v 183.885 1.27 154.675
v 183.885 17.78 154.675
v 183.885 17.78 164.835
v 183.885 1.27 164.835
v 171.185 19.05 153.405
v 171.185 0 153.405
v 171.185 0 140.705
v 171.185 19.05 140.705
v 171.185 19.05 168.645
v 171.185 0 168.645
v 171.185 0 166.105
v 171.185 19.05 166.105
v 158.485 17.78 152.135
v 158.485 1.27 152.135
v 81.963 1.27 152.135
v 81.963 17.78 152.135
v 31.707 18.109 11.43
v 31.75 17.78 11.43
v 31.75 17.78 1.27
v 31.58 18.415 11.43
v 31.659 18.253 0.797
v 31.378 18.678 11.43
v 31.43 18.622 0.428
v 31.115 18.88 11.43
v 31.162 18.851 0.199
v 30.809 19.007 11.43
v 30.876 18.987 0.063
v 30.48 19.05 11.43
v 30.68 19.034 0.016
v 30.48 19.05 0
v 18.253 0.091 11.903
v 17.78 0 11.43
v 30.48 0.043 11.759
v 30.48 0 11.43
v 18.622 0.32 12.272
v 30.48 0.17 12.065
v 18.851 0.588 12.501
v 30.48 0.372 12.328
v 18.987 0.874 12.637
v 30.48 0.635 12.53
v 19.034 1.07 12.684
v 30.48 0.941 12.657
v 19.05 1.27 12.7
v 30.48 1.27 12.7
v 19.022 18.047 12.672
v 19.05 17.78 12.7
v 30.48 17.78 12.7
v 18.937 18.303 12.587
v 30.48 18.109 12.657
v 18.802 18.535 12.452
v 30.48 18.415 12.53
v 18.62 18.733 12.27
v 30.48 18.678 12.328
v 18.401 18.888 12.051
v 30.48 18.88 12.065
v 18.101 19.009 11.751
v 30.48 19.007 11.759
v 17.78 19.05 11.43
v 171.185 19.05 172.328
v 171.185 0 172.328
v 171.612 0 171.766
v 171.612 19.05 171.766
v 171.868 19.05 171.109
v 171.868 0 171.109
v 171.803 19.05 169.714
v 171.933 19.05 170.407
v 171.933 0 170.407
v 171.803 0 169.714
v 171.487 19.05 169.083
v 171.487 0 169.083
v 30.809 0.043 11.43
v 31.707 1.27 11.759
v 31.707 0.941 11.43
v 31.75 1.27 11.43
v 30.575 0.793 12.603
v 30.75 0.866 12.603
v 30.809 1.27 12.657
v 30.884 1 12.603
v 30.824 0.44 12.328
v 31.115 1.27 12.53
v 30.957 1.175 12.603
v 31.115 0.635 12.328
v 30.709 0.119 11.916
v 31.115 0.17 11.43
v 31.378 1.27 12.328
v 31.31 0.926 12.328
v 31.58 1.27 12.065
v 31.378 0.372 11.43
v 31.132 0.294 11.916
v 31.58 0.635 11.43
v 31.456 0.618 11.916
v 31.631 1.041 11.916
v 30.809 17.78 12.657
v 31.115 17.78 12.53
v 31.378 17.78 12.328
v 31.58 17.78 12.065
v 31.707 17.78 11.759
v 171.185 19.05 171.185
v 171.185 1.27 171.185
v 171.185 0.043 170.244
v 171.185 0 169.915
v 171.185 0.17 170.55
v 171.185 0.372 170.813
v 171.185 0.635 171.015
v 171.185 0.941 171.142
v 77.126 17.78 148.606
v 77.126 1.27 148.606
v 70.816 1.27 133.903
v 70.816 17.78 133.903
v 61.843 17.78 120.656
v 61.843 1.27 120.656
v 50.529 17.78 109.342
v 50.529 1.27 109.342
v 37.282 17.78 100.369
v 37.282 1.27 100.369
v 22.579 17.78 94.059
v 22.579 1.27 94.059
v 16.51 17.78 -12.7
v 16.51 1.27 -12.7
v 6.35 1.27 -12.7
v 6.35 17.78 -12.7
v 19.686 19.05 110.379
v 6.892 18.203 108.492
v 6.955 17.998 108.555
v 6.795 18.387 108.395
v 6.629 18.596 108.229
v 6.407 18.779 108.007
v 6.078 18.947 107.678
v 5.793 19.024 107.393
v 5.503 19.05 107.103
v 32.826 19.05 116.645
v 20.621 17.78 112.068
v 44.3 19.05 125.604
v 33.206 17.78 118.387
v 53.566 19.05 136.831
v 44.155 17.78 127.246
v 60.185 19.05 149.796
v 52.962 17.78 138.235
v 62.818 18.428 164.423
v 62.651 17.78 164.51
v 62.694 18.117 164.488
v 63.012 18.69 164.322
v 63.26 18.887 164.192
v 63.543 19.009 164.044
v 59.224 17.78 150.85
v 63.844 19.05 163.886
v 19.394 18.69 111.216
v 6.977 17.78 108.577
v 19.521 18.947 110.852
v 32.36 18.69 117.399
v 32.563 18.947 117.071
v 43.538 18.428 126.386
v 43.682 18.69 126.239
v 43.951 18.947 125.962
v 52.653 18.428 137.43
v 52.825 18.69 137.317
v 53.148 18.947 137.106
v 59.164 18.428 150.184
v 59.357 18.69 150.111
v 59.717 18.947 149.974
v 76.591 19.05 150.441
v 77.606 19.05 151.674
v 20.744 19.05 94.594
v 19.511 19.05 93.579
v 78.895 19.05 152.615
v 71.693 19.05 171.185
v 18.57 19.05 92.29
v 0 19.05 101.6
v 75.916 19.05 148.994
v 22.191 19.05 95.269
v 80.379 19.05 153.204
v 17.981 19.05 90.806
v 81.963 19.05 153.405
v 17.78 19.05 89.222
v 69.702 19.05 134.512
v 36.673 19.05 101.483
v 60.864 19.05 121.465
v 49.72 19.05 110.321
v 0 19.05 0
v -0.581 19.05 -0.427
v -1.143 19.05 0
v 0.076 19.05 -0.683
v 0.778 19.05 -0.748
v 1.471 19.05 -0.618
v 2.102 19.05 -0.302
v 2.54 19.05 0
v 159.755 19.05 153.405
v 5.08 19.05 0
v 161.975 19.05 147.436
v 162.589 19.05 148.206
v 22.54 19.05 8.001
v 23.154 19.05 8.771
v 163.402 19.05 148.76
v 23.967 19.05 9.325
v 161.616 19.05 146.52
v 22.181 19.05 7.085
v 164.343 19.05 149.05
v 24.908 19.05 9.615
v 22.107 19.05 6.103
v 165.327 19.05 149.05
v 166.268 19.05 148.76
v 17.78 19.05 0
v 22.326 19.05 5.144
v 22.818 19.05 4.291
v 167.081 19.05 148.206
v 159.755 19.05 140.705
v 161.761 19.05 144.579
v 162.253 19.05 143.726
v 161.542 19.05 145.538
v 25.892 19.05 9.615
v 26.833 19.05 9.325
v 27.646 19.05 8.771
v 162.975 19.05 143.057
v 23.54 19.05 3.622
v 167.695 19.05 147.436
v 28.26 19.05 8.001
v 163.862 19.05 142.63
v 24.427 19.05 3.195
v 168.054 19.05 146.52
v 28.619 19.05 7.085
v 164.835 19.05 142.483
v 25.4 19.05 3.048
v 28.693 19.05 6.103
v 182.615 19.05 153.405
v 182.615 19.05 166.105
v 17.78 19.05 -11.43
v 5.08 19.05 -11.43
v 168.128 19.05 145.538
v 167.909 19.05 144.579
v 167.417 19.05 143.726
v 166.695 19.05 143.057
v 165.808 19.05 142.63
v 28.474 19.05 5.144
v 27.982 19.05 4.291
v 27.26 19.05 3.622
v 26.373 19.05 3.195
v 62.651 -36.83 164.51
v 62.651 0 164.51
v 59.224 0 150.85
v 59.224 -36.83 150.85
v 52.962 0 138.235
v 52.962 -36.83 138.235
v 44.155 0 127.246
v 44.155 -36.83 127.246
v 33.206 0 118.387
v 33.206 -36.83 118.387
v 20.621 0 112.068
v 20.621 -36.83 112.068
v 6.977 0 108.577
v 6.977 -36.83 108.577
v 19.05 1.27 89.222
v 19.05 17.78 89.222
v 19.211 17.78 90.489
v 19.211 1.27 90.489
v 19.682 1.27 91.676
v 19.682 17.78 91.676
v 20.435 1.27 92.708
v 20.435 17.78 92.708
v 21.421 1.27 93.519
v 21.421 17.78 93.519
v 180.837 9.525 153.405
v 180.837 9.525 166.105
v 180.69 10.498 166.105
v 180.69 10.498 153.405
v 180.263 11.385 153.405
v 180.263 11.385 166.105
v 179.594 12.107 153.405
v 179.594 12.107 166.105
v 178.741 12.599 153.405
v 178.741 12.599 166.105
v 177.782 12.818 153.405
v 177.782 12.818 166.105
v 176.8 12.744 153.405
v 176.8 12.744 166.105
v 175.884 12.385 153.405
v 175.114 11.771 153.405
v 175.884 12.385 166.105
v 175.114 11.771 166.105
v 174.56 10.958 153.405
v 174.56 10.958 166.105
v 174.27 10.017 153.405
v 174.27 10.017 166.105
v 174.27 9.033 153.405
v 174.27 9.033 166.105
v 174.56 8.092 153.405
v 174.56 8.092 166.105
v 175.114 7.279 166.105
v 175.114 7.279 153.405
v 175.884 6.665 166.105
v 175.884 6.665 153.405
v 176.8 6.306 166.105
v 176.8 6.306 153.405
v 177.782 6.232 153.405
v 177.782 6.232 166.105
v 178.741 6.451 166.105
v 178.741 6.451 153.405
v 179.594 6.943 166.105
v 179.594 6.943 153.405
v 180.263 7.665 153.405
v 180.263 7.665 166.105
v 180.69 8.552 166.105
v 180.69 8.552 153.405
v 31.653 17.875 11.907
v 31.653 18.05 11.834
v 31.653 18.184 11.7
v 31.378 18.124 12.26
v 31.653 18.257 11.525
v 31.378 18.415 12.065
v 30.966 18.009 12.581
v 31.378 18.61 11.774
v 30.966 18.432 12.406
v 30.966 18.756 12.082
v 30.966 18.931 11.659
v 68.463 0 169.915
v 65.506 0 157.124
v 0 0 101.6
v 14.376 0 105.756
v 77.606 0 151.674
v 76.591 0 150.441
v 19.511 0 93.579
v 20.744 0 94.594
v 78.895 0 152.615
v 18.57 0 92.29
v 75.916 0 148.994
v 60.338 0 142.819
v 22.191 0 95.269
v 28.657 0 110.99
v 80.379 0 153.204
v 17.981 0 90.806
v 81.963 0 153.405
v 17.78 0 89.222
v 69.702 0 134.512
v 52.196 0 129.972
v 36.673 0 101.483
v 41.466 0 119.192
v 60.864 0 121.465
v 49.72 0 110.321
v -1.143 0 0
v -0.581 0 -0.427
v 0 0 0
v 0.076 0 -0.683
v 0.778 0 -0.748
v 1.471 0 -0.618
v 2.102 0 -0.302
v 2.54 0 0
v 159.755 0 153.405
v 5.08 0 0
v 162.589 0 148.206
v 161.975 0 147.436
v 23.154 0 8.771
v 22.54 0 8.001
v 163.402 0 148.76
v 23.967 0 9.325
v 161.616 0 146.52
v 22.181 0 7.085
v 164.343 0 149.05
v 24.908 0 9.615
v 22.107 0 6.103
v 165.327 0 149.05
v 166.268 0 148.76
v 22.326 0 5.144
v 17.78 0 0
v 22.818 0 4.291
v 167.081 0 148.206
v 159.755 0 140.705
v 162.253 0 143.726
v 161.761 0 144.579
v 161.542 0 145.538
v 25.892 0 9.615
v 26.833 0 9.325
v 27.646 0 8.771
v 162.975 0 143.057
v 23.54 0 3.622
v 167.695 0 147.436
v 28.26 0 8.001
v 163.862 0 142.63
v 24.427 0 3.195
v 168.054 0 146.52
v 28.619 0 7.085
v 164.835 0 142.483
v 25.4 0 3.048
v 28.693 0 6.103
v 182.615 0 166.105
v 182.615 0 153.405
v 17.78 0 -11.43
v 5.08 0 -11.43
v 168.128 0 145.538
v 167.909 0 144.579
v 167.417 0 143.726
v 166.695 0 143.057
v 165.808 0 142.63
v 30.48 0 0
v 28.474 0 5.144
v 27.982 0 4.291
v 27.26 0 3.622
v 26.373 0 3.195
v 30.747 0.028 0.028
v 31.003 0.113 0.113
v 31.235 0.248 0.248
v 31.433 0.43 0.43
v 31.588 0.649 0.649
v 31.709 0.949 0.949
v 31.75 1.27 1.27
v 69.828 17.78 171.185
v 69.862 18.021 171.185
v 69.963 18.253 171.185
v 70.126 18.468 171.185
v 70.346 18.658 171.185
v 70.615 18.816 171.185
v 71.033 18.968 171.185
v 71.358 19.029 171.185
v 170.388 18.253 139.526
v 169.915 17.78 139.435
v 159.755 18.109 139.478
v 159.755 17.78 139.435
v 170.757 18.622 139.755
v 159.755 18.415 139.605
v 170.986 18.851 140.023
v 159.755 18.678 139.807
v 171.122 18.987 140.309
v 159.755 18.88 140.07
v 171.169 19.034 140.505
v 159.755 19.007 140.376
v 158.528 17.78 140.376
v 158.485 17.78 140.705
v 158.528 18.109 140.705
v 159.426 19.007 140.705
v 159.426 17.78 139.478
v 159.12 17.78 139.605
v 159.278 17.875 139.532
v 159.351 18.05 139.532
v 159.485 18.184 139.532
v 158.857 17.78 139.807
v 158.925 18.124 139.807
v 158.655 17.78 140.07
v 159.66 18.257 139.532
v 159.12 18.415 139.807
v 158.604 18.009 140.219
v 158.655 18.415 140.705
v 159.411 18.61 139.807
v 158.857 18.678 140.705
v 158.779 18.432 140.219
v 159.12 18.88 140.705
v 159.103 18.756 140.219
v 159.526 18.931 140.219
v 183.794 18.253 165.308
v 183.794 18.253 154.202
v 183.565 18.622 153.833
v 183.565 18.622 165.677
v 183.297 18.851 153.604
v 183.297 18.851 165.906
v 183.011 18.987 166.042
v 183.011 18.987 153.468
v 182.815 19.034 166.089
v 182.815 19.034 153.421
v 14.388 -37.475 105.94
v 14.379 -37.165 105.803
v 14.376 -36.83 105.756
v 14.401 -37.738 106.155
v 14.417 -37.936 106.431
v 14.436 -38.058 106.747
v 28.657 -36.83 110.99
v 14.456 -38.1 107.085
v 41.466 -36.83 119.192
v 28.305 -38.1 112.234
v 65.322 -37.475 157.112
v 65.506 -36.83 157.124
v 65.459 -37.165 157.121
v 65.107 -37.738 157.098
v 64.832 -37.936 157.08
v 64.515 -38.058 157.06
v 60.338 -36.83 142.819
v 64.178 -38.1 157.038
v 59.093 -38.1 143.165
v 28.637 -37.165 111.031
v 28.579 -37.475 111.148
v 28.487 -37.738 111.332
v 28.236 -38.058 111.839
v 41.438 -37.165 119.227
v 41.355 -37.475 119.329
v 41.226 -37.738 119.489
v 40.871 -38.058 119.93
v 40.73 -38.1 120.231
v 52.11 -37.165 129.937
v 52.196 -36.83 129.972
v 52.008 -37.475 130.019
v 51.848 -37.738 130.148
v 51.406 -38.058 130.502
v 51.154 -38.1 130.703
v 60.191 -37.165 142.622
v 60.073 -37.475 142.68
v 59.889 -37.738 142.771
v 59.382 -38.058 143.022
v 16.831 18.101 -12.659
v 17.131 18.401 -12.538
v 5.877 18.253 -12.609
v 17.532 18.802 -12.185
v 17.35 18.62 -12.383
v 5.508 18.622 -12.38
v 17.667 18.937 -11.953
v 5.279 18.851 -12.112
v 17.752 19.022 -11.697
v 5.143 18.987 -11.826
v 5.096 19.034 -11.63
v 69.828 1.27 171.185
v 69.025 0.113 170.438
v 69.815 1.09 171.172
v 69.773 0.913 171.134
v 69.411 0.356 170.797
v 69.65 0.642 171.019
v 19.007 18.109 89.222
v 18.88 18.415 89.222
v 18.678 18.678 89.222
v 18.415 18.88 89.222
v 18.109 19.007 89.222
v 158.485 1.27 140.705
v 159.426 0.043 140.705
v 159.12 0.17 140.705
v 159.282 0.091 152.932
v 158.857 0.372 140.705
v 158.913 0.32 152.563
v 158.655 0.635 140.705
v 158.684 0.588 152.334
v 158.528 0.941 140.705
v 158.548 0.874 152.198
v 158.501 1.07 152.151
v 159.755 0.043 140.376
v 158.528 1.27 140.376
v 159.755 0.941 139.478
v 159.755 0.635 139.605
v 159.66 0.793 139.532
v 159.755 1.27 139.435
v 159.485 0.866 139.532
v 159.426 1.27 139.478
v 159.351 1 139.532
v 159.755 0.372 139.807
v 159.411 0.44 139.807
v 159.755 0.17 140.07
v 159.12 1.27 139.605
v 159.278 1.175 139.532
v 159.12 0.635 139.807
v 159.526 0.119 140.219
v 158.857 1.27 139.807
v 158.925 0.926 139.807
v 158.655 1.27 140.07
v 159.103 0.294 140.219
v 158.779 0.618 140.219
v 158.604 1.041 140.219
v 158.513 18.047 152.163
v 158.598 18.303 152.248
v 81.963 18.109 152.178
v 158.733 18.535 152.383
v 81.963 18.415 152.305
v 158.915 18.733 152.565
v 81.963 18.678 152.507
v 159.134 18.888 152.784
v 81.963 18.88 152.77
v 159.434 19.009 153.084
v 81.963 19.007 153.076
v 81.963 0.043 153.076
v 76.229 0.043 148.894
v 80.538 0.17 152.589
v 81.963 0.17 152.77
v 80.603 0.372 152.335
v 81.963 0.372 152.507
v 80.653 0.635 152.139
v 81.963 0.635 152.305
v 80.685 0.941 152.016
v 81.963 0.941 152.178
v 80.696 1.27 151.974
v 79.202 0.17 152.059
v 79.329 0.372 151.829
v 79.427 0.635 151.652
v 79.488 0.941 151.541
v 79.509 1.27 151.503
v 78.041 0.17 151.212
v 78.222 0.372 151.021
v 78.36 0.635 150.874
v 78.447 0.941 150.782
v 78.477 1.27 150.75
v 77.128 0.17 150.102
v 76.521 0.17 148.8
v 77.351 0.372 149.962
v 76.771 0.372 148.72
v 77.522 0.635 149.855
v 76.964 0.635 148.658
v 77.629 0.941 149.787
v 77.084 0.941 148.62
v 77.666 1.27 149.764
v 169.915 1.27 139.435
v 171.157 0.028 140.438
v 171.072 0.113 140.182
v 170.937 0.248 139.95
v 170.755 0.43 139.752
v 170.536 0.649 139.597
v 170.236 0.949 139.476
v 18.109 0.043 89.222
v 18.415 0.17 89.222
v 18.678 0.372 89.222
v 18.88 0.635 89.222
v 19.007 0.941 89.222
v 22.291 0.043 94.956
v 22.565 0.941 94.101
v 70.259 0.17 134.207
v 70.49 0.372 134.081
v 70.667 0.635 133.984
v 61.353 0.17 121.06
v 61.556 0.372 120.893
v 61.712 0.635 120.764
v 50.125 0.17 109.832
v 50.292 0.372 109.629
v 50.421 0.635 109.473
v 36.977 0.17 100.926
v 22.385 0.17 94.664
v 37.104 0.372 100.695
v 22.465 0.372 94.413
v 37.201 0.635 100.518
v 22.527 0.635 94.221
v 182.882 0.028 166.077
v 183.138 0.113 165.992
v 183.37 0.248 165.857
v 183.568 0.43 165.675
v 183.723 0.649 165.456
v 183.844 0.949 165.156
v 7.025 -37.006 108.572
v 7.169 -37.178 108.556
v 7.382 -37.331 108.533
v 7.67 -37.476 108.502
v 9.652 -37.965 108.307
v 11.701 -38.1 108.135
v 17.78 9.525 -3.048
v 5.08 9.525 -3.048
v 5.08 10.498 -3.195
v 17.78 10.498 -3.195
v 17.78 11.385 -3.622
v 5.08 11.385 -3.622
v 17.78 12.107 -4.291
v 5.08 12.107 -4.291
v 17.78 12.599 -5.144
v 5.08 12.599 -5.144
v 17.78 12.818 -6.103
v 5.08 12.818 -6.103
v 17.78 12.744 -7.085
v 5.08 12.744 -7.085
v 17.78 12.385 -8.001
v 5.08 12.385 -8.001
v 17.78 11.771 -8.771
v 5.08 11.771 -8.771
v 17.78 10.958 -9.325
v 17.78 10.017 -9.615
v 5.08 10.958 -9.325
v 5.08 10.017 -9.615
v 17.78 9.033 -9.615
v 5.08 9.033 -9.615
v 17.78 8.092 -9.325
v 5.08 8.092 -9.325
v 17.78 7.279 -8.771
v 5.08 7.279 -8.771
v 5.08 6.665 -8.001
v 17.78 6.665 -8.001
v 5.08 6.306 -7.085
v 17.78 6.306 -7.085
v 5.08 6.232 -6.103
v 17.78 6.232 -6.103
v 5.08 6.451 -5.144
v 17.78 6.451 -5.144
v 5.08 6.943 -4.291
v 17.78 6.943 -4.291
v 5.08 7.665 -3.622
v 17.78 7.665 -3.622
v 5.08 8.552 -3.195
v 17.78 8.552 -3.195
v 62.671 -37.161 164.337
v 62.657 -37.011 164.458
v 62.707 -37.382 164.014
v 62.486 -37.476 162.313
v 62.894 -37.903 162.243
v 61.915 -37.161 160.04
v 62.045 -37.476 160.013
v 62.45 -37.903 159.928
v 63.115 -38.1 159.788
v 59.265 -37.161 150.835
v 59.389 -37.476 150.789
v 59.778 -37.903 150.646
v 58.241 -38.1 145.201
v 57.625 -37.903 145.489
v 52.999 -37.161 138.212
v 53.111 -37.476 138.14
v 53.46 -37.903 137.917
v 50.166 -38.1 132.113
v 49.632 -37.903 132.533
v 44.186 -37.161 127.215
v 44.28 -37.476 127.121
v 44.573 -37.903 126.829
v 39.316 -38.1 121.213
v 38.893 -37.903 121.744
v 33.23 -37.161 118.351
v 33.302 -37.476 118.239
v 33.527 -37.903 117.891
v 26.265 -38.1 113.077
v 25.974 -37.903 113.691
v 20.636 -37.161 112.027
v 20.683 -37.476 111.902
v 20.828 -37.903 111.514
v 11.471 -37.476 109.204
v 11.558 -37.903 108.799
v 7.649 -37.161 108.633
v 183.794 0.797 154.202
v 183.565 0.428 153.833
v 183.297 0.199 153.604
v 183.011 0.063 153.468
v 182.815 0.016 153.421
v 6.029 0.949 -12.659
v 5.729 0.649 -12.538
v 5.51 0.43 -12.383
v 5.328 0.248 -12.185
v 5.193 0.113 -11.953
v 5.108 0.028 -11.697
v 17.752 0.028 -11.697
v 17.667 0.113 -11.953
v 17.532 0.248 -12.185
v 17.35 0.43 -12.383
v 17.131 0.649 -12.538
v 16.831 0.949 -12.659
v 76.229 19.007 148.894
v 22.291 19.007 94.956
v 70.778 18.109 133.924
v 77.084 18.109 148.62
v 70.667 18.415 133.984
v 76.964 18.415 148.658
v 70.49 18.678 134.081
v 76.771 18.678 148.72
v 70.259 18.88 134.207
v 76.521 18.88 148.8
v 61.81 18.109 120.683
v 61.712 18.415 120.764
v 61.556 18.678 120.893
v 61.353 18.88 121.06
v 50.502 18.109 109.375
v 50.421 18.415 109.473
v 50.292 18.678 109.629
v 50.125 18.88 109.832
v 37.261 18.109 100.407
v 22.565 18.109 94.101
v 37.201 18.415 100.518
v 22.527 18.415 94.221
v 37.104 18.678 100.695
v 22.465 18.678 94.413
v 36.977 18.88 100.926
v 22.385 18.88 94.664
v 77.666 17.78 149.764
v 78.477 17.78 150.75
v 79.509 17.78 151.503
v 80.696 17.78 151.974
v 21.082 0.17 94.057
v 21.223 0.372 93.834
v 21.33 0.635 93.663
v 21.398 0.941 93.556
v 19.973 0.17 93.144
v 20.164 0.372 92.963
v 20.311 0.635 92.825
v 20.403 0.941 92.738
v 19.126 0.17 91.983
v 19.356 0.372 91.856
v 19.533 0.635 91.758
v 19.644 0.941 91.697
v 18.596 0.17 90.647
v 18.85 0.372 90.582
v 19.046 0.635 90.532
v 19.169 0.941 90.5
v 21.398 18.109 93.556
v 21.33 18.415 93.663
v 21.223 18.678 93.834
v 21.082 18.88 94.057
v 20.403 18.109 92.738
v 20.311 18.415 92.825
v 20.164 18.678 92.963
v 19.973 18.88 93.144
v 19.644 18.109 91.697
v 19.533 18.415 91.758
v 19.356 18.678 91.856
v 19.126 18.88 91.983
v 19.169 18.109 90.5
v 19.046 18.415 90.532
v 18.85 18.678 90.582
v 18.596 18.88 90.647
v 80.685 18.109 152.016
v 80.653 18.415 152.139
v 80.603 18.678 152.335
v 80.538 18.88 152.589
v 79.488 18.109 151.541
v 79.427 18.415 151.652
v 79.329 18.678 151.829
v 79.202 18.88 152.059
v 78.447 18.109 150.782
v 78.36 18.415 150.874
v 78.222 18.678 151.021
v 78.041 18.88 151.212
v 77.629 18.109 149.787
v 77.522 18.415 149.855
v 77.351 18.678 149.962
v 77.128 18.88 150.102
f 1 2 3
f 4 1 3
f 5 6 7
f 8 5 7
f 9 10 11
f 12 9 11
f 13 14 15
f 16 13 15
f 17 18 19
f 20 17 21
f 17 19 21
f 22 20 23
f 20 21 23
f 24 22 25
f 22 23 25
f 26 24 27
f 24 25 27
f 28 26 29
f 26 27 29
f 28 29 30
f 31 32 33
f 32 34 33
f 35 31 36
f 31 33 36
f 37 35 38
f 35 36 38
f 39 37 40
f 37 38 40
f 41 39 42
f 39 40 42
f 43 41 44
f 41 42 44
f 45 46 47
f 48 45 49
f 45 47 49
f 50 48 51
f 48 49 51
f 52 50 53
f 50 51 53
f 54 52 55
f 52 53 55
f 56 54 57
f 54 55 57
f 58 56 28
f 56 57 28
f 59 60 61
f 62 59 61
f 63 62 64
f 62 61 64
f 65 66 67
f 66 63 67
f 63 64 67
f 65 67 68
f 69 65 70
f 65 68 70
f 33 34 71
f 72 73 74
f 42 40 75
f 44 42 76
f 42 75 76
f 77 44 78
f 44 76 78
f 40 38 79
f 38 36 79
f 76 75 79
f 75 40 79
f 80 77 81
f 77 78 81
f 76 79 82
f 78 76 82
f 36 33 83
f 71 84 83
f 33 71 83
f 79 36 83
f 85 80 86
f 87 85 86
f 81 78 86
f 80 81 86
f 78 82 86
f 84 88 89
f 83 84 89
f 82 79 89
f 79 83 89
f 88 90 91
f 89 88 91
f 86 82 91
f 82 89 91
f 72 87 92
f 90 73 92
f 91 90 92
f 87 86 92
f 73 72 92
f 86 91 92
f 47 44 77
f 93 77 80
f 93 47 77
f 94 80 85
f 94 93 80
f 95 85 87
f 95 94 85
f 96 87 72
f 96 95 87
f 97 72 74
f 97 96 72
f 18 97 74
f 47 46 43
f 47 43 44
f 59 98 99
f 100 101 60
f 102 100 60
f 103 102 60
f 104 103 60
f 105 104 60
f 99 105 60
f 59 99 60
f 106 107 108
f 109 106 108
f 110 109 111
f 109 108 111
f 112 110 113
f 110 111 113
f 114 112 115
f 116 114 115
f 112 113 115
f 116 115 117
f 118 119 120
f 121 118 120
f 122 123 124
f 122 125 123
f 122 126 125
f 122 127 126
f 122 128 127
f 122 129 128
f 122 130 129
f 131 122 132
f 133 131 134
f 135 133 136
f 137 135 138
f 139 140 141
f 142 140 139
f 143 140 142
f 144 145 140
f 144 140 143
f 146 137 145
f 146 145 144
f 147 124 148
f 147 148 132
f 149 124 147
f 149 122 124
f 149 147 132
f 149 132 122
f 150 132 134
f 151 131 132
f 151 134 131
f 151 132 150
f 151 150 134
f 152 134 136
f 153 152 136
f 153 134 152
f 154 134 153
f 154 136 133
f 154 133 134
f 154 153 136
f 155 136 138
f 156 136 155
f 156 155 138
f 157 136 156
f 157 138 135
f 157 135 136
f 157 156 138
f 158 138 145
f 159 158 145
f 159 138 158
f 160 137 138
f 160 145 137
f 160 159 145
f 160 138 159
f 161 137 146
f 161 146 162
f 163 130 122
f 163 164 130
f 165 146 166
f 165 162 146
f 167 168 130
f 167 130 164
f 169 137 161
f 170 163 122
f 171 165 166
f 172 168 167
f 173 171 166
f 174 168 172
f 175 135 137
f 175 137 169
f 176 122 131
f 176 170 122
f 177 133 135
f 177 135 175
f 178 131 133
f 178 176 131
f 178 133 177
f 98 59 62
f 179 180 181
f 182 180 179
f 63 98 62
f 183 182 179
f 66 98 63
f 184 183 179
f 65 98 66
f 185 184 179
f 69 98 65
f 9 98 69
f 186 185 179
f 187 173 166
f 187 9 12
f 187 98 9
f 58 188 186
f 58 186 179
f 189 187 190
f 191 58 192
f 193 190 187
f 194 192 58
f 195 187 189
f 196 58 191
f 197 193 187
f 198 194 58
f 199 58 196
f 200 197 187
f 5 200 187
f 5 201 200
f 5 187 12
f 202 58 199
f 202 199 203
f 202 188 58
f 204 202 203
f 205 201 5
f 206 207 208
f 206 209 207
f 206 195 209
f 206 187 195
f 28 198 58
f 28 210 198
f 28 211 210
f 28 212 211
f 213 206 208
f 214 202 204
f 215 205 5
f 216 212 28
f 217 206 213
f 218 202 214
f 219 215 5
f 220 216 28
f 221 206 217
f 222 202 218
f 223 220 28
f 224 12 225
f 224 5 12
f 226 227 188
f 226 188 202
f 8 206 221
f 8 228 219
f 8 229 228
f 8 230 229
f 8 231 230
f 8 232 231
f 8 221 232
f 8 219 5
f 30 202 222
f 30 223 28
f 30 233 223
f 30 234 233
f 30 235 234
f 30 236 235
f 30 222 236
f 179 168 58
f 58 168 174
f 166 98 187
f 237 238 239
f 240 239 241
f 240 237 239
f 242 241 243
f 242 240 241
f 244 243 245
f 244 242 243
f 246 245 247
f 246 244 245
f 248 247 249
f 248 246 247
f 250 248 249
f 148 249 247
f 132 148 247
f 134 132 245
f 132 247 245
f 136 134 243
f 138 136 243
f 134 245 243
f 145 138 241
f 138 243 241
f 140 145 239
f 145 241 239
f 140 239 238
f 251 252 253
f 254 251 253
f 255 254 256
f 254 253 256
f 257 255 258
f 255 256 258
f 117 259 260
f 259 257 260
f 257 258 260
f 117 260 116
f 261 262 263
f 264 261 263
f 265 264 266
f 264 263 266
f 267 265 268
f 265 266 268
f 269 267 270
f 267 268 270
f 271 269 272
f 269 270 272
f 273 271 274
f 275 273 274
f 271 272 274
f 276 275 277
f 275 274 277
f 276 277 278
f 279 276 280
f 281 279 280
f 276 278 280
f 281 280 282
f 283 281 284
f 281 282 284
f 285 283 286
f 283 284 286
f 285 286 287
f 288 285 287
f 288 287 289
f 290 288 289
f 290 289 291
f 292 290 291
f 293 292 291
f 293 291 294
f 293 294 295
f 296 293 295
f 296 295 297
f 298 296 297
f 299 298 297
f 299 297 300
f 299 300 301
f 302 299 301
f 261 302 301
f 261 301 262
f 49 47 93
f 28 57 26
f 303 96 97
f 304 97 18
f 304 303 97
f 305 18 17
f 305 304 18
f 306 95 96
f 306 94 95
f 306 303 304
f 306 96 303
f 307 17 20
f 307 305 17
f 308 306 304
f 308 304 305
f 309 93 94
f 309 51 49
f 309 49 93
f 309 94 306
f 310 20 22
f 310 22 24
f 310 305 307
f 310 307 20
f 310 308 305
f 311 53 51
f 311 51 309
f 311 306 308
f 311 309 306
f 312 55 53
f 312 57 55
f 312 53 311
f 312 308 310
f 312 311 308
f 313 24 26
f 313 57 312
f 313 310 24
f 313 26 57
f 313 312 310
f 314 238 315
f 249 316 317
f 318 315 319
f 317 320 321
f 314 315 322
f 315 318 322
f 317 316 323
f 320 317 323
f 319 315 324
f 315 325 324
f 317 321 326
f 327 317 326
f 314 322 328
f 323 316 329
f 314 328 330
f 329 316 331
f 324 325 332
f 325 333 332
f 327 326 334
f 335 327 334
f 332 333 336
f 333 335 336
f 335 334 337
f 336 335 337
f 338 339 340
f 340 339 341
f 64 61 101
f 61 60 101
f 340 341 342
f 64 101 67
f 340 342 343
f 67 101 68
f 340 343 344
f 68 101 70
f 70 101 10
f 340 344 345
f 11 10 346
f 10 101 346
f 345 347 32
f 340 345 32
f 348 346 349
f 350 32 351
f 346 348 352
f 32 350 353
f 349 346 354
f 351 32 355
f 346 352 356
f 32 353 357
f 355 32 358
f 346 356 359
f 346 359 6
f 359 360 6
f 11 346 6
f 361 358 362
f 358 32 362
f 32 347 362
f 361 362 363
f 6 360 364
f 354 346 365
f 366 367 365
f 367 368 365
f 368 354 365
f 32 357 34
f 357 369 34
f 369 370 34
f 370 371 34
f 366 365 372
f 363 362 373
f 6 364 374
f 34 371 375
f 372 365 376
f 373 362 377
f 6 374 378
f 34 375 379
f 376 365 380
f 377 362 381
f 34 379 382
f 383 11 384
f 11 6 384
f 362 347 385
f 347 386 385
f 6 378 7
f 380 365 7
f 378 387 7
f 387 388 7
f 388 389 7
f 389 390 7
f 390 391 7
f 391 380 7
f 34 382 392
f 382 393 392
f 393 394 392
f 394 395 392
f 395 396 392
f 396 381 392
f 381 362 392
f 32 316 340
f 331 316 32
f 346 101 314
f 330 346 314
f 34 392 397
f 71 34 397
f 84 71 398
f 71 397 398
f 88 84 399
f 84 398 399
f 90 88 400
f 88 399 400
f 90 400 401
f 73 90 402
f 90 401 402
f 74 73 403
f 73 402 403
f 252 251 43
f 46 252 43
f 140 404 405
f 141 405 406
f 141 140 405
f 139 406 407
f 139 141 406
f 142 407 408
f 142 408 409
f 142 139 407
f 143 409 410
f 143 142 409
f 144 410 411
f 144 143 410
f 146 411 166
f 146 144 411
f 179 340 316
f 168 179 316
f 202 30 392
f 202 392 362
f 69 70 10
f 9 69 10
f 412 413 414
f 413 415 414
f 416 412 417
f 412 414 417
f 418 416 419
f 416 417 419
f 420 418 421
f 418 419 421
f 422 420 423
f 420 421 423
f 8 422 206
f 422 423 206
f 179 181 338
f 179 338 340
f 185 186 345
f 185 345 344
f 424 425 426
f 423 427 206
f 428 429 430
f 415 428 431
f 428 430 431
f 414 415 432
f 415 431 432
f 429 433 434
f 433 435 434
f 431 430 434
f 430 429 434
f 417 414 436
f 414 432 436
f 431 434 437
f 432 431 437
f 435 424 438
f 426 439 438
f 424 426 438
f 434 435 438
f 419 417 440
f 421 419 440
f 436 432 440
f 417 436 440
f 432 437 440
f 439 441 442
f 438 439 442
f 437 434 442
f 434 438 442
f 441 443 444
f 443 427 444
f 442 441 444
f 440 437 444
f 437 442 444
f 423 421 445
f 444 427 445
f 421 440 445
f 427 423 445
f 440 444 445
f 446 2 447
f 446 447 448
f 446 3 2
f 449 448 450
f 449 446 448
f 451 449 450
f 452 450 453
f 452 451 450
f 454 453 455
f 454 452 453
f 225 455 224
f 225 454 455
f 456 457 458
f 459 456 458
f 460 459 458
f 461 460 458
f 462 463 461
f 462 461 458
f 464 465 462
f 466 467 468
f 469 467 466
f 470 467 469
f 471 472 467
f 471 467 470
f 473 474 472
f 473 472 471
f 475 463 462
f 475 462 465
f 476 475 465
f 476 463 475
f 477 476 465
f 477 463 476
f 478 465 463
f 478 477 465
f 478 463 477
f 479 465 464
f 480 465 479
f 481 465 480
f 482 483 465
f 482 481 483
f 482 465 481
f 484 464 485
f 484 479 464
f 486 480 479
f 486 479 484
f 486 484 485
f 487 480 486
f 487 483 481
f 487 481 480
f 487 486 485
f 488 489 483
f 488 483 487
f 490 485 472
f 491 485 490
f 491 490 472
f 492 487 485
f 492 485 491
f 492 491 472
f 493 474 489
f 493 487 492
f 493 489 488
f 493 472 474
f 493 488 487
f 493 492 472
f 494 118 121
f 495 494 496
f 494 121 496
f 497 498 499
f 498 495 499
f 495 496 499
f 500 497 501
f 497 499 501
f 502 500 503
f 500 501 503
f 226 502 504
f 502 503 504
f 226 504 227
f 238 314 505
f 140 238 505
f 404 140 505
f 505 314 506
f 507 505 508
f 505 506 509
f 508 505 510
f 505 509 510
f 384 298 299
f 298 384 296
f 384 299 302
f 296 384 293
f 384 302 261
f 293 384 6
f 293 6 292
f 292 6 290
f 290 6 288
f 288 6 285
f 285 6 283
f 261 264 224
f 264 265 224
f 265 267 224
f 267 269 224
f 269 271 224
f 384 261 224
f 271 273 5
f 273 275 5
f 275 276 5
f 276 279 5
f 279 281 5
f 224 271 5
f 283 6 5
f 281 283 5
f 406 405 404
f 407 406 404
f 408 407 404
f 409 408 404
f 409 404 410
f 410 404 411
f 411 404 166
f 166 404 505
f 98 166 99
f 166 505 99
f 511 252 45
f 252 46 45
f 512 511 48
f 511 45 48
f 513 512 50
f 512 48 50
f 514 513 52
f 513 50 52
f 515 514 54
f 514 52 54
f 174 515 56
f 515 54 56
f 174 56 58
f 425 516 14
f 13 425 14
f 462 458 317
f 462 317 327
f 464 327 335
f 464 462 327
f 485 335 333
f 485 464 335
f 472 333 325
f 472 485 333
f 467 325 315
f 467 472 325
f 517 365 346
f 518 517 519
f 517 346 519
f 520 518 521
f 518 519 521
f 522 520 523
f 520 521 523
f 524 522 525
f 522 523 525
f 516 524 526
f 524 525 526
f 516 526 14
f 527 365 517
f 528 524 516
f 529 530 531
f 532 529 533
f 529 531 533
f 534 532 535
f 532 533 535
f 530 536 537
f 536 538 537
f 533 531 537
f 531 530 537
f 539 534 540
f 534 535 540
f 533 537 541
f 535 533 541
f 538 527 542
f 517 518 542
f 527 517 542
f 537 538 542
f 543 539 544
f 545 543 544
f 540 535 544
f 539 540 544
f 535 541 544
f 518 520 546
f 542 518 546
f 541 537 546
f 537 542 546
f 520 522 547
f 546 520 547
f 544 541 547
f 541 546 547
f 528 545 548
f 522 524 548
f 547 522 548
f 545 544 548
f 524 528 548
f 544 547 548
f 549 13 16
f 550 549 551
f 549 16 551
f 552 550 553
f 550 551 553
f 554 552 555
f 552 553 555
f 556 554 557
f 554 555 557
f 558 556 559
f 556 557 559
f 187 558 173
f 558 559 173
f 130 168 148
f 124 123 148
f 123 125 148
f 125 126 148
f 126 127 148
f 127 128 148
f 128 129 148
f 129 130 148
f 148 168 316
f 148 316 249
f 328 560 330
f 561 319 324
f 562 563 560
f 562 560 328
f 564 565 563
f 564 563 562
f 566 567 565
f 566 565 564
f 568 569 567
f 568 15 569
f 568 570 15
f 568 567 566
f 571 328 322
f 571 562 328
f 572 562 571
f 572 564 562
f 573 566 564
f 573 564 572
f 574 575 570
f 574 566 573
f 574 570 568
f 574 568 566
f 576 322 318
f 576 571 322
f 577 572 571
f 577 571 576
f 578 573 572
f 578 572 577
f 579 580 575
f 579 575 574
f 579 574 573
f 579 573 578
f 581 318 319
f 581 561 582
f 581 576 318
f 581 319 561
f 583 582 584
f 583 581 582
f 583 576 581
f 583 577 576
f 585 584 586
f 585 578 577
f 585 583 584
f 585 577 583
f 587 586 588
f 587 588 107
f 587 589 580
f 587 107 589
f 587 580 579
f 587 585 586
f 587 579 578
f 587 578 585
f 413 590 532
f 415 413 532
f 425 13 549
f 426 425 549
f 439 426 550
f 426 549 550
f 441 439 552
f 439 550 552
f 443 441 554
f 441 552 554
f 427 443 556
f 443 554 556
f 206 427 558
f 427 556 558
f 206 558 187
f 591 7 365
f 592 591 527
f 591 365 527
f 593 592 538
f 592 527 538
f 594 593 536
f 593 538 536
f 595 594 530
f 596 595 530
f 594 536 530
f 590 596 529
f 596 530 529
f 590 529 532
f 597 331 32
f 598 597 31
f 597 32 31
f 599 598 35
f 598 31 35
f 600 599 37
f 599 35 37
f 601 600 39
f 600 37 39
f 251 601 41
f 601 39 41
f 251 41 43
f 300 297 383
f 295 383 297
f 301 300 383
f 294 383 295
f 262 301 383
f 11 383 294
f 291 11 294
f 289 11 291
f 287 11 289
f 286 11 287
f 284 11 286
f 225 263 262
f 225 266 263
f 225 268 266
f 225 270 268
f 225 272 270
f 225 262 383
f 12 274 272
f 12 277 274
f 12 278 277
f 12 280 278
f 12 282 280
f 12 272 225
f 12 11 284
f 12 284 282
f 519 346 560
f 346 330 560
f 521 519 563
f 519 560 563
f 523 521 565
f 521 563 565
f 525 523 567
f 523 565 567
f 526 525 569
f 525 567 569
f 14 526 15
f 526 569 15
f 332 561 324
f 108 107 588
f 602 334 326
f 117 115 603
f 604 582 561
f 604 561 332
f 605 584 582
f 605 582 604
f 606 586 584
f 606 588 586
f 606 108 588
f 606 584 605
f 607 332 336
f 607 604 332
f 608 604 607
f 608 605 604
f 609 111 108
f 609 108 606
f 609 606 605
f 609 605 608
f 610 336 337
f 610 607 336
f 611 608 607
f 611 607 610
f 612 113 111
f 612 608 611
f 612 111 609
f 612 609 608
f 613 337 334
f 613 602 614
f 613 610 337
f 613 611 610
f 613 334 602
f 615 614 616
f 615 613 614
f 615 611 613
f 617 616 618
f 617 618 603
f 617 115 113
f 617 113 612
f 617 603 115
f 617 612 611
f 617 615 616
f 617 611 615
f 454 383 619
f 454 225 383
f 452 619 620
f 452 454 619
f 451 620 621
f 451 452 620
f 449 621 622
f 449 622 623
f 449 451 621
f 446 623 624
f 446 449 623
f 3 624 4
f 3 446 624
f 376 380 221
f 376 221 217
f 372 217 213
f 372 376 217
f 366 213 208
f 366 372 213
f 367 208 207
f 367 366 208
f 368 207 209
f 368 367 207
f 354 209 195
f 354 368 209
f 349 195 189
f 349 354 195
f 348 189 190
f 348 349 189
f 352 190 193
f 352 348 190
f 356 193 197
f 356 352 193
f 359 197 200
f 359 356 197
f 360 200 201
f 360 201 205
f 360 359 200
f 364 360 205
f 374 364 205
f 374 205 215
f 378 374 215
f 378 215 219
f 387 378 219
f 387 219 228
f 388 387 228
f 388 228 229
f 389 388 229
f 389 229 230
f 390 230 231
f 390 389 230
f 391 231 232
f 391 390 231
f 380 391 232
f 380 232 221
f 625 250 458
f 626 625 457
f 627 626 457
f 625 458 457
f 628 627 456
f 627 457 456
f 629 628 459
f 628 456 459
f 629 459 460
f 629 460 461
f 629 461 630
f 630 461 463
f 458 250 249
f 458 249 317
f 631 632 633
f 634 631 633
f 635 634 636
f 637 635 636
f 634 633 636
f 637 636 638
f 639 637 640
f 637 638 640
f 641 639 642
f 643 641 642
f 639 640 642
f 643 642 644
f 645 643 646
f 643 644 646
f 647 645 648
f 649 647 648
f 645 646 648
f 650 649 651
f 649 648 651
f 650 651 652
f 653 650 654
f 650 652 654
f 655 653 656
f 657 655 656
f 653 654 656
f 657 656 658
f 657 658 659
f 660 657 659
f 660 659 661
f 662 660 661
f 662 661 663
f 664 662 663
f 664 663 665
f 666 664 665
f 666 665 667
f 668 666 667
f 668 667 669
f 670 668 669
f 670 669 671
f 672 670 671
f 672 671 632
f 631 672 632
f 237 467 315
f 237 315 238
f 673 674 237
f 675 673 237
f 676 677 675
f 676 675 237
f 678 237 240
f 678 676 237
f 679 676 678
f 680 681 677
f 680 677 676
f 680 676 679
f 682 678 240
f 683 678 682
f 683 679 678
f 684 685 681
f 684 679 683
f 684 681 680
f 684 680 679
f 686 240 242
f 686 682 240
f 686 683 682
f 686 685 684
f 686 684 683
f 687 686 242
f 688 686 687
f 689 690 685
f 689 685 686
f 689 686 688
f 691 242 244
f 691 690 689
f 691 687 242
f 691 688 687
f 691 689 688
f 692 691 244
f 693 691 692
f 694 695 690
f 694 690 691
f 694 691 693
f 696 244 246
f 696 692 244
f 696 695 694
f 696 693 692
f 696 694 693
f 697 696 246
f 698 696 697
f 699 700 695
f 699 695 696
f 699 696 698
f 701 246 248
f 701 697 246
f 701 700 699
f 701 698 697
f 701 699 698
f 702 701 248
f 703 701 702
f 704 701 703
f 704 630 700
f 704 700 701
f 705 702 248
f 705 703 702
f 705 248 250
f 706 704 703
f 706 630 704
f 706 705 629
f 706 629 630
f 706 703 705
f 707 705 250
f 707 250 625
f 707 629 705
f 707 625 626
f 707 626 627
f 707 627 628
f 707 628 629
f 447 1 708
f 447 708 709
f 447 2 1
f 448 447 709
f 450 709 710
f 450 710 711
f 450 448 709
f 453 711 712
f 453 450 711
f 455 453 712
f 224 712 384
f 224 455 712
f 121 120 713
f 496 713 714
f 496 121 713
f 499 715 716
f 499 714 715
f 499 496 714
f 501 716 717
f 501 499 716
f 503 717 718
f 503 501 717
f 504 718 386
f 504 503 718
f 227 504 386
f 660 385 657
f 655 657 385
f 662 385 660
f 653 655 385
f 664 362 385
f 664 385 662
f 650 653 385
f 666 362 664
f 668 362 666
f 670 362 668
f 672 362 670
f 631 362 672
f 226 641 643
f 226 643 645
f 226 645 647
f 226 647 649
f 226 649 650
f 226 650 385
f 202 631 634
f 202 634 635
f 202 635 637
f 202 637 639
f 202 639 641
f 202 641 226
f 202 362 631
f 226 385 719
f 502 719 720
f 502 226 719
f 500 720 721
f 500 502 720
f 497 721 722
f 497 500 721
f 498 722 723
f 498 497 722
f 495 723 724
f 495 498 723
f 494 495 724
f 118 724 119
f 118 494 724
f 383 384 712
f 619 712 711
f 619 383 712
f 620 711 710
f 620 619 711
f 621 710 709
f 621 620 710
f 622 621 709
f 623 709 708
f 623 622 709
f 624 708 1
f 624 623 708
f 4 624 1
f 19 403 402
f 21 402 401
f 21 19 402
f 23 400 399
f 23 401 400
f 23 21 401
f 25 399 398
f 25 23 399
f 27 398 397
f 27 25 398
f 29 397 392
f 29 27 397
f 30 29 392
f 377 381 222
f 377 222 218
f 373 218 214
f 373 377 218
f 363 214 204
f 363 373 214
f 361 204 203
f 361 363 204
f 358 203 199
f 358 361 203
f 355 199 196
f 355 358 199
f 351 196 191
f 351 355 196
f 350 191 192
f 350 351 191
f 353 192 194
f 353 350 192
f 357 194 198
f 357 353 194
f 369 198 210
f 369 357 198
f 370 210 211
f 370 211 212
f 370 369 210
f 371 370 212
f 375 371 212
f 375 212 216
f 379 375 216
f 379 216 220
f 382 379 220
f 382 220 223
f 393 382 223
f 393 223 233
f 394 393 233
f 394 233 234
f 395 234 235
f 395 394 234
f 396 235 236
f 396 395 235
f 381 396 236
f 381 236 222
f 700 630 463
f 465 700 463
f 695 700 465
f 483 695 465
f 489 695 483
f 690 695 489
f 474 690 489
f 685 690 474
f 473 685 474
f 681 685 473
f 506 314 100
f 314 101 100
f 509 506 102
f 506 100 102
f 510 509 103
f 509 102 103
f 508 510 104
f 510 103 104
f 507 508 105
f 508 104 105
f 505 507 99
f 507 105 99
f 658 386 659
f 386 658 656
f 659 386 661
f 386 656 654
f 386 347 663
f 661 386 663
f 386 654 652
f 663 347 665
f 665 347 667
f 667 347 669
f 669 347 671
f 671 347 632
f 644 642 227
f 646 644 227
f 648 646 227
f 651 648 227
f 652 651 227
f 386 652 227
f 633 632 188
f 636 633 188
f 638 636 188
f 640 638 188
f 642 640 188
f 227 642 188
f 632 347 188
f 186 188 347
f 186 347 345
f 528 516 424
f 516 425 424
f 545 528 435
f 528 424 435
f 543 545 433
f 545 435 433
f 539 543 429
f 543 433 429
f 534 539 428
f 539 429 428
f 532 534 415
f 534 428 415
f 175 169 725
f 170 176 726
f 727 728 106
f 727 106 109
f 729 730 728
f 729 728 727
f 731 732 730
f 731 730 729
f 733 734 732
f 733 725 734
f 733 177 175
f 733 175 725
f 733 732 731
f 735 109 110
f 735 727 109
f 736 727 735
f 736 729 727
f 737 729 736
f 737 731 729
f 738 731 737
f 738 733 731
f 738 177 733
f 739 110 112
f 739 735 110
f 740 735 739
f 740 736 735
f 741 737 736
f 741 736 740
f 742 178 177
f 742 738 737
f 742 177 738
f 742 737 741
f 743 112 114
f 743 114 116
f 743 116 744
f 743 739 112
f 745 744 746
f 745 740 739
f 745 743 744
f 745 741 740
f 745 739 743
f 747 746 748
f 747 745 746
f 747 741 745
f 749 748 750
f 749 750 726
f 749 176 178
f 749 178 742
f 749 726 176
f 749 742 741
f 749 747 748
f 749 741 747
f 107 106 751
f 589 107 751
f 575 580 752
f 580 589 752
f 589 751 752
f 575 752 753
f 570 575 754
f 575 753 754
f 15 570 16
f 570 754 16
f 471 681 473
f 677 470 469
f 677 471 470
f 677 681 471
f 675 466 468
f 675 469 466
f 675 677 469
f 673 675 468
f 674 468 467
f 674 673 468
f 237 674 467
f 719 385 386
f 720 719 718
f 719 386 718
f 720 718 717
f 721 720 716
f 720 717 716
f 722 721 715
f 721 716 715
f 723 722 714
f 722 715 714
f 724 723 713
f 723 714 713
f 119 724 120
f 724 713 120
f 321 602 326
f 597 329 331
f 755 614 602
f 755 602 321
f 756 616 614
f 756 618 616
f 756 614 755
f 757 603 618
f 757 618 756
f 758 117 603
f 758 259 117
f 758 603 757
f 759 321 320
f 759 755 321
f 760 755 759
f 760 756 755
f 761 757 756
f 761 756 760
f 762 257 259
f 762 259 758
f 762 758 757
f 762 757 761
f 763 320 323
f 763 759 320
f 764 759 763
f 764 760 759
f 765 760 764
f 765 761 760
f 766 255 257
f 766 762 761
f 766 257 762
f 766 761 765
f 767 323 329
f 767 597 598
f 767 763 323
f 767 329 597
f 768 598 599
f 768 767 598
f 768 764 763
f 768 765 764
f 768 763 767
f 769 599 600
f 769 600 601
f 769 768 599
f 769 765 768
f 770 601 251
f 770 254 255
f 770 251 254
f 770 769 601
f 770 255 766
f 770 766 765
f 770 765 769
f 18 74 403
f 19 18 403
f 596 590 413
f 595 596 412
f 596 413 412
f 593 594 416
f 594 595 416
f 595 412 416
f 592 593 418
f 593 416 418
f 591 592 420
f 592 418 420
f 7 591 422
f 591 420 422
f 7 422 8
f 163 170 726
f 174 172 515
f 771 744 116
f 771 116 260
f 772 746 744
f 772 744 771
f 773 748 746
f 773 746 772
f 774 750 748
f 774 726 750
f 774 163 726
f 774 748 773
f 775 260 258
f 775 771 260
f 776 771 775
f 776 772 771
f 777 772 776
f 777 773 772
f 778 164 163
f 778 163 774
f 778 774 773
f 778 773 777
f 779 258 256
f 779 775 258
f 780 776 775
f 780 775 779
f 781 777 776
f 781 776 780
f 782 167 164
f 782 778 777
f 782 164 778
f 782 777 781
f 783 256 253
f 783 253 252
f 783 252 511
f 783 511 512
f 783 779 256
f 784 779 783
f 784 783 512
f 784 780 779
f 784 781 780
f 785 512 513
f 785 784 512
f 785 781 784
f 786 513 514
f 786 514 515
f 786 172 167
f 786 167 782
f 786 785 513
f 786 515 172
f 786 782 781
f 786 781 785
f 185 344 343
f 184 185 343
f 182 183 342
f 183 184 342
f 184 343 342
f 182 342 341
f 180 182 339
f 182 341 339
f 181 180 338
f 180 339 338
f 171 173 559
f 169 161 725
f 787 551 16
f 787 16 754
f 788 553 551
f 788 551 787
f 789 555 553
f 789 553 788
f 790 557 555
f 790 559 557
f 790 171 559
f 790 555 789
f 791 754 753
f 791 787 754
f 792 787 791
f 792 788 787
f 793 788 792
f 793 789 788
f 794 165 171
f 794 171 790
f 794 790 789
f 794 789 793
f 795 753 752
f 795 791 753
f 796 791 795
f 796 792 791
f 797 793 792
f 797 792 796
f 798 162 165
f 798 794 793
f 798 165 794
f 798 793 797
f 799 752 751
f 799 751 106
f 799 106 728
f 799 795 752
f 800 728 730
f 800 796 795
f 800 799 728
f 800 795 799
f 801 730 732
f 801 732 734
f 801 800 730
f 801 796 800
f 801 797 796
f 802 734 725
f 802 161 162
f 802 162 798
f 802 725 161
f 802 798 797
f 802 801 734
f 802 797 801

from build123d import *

# Parameters (mm, degrees)
SKETCH1_R           = 3.302
BOSS_EXTRUDE1_DEPTH = 19.05
CHAMFER1_SIZE       = 6.593417442
CHAMFER1_SIZE_2     = 6.35
FILLET1_R           = 5.08
FILLET2_R           = 1.27
FILLET3_R           = 1.27
BOSS_EXTRUDE2_START = 38.1
BOSS_EXTRUDE2_DEPTH = 38.1
FILLET5_R           = 2.54
FILLET6_R           = 1.27
SKETCH7_W           = 12.7
SKETCH7_H           = 19.05
BOSS_EXTRUDE3_DEPTH = 12.7
CUT_EXTRUDE5_REACH  = 244.877
SKETCH8_R           = 3.302
SKETCH9_W           = 12.7
SKETCH9_H           = 19.05
BOSS_EXTRUDE4_DEPTH = 12.7
CUT_EXTRUDE6_REACH  = 261.3
SKETCH10_R          = 3.302
FILLET7_R           = 1.27


with BuildPart() as part:
    # Sketch1 → Boss-Extrude1 (new body)
    with BuildSketch(Plane(origin=(0, 0, 0), x_dir=(1, 0, 0), z_dir=(0, 1, 0))):
        with BuildLine():
            Line((0, 0), (0, -107.95))
            ThreePointArc((0, -107.95), (44.047088178, -127.137896363), (63.234984541, -171.184984541))
            Line((63.234984541, -171.184984541), (171.184984541, -171.184984541))
            Line((171.184984541, -171.184984541), (171.184984541, -172.327984541))
            Line((171.184984541, -172.327984541), (173.724984541, -172.327984541))
            Line((173.724984541, -172.327984541), (171.184984541, -168.644984541))
            Line((171.184984541, -168.644984541), (171.184984541, -139.434984541))
            Line((171.184984541, -139.434984541), (158.484984541, -139.434984541))
            Line((158.484984541, -139.434984541), (158.484984541, -152.134984541))
            Line((158.484984541, -152.134984541), (78.172986392, -152.134984541))
            ThreePointArc((78.172986392, -152.134984541), (56.455029962, -114.729954579), (19.05, -93.011998149))
            Line((19.05, -93.011998149), (19.05, -12.7))
            Line((19.05, -12.7), (31.75, -12.7))
            Line((31.75, -12.7), (31.75, 0))
            Line((31.75, 0), (2.54, 0))
            Line((2.54, 0), (-1.143, 2.54))
            Line((-1.143, 2.54), (-1.143, 0))
            Line((-1.143, 0), (0, 0))
        make_face()
        with Locations(Location((25.4, -6.35, 0), (0, 0, 90))):
            Circle(SKETCH1_R, mode=Mode.SUBTRACT)
        with Locations(Location((164.834984541, -145.784984541, 0), (0, 0, 90))):
            Circle(SKETCH1_R, mode=Mode.SUBTRACT)
    extrude(amount=BOSS_EXTRUDE1_DEPTH)

    # Chamfer1
    # the kernel refuses this chamfer: 6.593417442, 6.35 mm, written as the material it takes off along each edge
    with BuildSketch(Plane(origin=(63.234984541, -17.246656522, 171.184984541), x_dir=(-0.0872058515963271, 0, -0.9961903128656489), z_dir=(0, 1, 0))) as chamfer1_piece_1:
        with BuildLine():
            Line((6.700635555, 0), (-CHAMFER1_SIZE * 0.0872058515927, -CHAMFER1_SIZE * 0.996190312824))
            Line((-CHAMFER1_SIZE * 0.0872058515927, -CHAMFER1_SIZE * 0.996190312824), (0, 0))
            ThreePointArc((0, 0), (3.448459053, -0.085459063), (6.700635555, 0))
        make_face()
    extrude(amount=53.543313044, mode=Mode.SUBTRACT)
    with BuildSketch(Plane(origin=(0, -18.02411909, 107.95), x_dir=(0, 0, -1), z_dir=(0, 1, 0))) as chamfer1_piece_2:
        with BuildLine():
            Line((CHAMFER1_SIZE_2, 0), (-0.627104296, -6.977104296))
            ThreePointArc((-0.627104296, -6.977104296), (-0.229600221, -3.597999822), (0, 0))
            Line((0, 0), (CHAMFER1_SIZE_2, 0))
        make_face()
    extrude(amount=55.098238181, mode=Mode.SUBTRACT)

    # Fillet1
    fillet1_edges = [part.edges().sort_by_distance(p)[0] for p in [
        (19.05, 9.525, 93.011998149),
        (78.172986392, 9.525, 152.134984541),
    ]]
    fillet(fillet1_edges, radius=FILLET1_R)

    # Fillet2
    fillet2_edges = [part.edges().sort_by_distance(p)[0] for p in [
        (158.484984541, 19.05, 145.784984541),
        (120.223999201, 19.05, 152.134984541),
        (31.75, 0, 6.35),
        (25.4, 0, 12.7),
        (120.223999201, 0, 152.134984541),
        (158.484984541, 0, 145.784984541),
        (164.834984541, 0, 139.434984541),
        (25.4, 19.05, 12.7),
        (31.75, 9.525, 0),
        (31.75, 9.525, 12.7),
        (158.484984541, 9.525, 139.434984541),
        (171.184984541, 9.525, 139.434984541),
        (31.75, 19.05, 6.35),
        (44.154800127, 19.05, 127.245858784),
        (66.239525947, 19.05, 167.847430426),
        (56.455029962, 0, 114.729954579),
        (56.455029962, 19.05, 114.729954579),
        (19.05, 0, 50.96098534),
        (19.05, 19.05, 50.96098534),
        (78.969227792, 0, 151.159085536),
        (78.969227792, 19.05, 151.159085536),
        (20.025899005, 0, 92.215756749),
        (20.025899005, 19.05, 92.215756749),
        (164.834984541, 19.05, 139.434984541),
    ]]
    fillet(fillet2_edges, radius=FILLET2_R)

    # Fillet3
    fillet3_edges = [part.edges().sort_by_distance(p)[0] for p in [
        (120.506693262, 0, 171.184984541),
    ]]
    fillet(fillet3_edges, radius=FILLET3_R)

    # Sketch6 → Boss-Extrude2 (add)
    with BuildSketch(Plane.XZ.offset(BOSS_EXTRUDE2_START)):
        with BuildLine():
            Line((6.977104296, 108.577104296), (14.376413508, 105.755665739))
            ThreePointArc((14.376413508, 105.755665739), (47.125159878, 124.289265483), (65.50643038, 157.123753494))
            Line((65.50643038, 157.123753494), (62.650649911, 164.509876311))
            ThreePointArc((62.650649911, 164.509876311), (44.154800127, 127.245858784), (6.977104296, 108.577104296))
        make_face()
    extrude(amount=-BOSS_EXTRUDE2_DEPTH)

    # Fillet5
    # the kernel refuses this fillet: 2.54 mm, written as the material it takes off along each edge
    with BuildSketch(Plane(origin=(173.724984541, -9.855086022, 172.327984541), x_dir=(-0.5677329558036762, 0, -0.8232127859152948), z_dir=(0, 1, 0))) as fillet5_piece_1:
        with BuildLine():
            CenterArc((3.942034409, 2.54), FILLET5_R, 190.182679729, 79.817320271)
            Line((1.442041708, 2.090960476), (0, 0))
            Line((0, 0), (3.942034409, 0))
        make_face()
    extrude(amount=38.760172045, mode=Mode.SUBTRACT)
    with BuildSketch(Plane(origin=(-1.143, -9.855086022, -2.54), x_dir=(0, 0, 1), z_dir=(0, 1, 0))) as fillet5_piece_2:
        with BuildLine():
            CenterArc((4.328983323, 1.80309142), FILLET5_R, 145.407711312, 79.817320271)
            Line((2.238022847, 3.245133128), (0, 0))
            Line((0, 0), (2.54, 0))
        make_face()
    extrude(amount=38.760172045, mode=Mode.SUBTRACT)

    # Fillet6
    fillet6_edges = [part.edges().sort_by_distance(p)[0] for p in [
        (47.125159878, -38.1, 124.289265483),
        (64.078540146, -38.1, 160.816814902),
        (44.154800127, -38.1, 127.245858784),
        (10.676758902, -38.1, 107.166385018),
    ]]
    fillet(fillet6_edges, radius=FILLET6_R)

    # Sketch7 → Boss-Extrude3 (add)
    with BuildSketch(Plane(origin=(0, 0, 0), x_dir=(-1, 0, 0), z_dir=(0, 0, -1))):
        with Locations((-11.43, 9.525)):
            Rectangle(SKETCH7_W, SKETCH7_H)
    extrude(amount=BOSS_EXTRUDE3_DEPTH)

    # Sketch8 → Cut-Extrude5 (cut, up to next)
    with BuildSketch(Plane.ZY.offset(-5.08), mode=Mode.PRIVATE) as cut_extrude5_sk1:
        with Locations((-6.35, 9.525)):
            Circle(SKETCH8_R)
    cut_extrude5_tool1 = extrude(cut_extrude5_sk1.sketch, amount=-CUT_EXTRUDE5_REACH, mode=Mode.PRIVATE) & part.part
    add(cut_extrude5_tool1.solids().sort_by_distance((5.08, 9.525, -6.35))[0], mode=Mode.SUBTRACT)

    # Sketch9 → Boss-Extrude4 (add)
    with BuildSketch(Plane(origin=(171.184984541, 0, -171.184984541), x_dir=(0, 0, 1), z_dir=(-1, 0, 0))):
        with Locations((330.939969082, 9.525)):
            Rectangle(SKETCH9_W, SKETCH9_H)
    extrude(amount=-BOSS_EXTRUDE4_DEPTH)

    # Sketch10 → Cut-Extrude6 (cut, up to next)
    with BuildSketch(Plane.XY.offset(166.104984541), mode=Mode.PRIVATE) as cut_extrude6_sk1:
        with Locations((177.534984541, 9.525)):
            Circle(SKETCH10_R)
    cut_extrude6_tool1 = extrude(cut_extrude6_sk1.sketch, amount=-CUT_EXTRUDE6_REACH, mode=Mode.PRIVATE) & part.part
    add(cut_extrude6_tool1.solids().sort_by_distance((177.534985, 9.525, 166.104985))[0], mode=Mode.SUBTRACT)

    # Fillet7
    fillet7_edges = [part.edges().sort_by_distance(p)[0] for p in [
        (17.78, 9.525, -12.7),
        (11.43, 0, -12.7),
        (5.08, 9.525, -12.7),
        (11.43, 19.05, -12.7),
        (183.884984541, 9.525, 153.404984541),
        (183.884984541, 19.05, 159.754984541),
        (183.884984541, 9.525, 166.104984541),
        (183.884984541, 0, 159.754984541),
    ]]
    fillet(fillet7_edges, radius=FILLET7_R)


solid = part.part
